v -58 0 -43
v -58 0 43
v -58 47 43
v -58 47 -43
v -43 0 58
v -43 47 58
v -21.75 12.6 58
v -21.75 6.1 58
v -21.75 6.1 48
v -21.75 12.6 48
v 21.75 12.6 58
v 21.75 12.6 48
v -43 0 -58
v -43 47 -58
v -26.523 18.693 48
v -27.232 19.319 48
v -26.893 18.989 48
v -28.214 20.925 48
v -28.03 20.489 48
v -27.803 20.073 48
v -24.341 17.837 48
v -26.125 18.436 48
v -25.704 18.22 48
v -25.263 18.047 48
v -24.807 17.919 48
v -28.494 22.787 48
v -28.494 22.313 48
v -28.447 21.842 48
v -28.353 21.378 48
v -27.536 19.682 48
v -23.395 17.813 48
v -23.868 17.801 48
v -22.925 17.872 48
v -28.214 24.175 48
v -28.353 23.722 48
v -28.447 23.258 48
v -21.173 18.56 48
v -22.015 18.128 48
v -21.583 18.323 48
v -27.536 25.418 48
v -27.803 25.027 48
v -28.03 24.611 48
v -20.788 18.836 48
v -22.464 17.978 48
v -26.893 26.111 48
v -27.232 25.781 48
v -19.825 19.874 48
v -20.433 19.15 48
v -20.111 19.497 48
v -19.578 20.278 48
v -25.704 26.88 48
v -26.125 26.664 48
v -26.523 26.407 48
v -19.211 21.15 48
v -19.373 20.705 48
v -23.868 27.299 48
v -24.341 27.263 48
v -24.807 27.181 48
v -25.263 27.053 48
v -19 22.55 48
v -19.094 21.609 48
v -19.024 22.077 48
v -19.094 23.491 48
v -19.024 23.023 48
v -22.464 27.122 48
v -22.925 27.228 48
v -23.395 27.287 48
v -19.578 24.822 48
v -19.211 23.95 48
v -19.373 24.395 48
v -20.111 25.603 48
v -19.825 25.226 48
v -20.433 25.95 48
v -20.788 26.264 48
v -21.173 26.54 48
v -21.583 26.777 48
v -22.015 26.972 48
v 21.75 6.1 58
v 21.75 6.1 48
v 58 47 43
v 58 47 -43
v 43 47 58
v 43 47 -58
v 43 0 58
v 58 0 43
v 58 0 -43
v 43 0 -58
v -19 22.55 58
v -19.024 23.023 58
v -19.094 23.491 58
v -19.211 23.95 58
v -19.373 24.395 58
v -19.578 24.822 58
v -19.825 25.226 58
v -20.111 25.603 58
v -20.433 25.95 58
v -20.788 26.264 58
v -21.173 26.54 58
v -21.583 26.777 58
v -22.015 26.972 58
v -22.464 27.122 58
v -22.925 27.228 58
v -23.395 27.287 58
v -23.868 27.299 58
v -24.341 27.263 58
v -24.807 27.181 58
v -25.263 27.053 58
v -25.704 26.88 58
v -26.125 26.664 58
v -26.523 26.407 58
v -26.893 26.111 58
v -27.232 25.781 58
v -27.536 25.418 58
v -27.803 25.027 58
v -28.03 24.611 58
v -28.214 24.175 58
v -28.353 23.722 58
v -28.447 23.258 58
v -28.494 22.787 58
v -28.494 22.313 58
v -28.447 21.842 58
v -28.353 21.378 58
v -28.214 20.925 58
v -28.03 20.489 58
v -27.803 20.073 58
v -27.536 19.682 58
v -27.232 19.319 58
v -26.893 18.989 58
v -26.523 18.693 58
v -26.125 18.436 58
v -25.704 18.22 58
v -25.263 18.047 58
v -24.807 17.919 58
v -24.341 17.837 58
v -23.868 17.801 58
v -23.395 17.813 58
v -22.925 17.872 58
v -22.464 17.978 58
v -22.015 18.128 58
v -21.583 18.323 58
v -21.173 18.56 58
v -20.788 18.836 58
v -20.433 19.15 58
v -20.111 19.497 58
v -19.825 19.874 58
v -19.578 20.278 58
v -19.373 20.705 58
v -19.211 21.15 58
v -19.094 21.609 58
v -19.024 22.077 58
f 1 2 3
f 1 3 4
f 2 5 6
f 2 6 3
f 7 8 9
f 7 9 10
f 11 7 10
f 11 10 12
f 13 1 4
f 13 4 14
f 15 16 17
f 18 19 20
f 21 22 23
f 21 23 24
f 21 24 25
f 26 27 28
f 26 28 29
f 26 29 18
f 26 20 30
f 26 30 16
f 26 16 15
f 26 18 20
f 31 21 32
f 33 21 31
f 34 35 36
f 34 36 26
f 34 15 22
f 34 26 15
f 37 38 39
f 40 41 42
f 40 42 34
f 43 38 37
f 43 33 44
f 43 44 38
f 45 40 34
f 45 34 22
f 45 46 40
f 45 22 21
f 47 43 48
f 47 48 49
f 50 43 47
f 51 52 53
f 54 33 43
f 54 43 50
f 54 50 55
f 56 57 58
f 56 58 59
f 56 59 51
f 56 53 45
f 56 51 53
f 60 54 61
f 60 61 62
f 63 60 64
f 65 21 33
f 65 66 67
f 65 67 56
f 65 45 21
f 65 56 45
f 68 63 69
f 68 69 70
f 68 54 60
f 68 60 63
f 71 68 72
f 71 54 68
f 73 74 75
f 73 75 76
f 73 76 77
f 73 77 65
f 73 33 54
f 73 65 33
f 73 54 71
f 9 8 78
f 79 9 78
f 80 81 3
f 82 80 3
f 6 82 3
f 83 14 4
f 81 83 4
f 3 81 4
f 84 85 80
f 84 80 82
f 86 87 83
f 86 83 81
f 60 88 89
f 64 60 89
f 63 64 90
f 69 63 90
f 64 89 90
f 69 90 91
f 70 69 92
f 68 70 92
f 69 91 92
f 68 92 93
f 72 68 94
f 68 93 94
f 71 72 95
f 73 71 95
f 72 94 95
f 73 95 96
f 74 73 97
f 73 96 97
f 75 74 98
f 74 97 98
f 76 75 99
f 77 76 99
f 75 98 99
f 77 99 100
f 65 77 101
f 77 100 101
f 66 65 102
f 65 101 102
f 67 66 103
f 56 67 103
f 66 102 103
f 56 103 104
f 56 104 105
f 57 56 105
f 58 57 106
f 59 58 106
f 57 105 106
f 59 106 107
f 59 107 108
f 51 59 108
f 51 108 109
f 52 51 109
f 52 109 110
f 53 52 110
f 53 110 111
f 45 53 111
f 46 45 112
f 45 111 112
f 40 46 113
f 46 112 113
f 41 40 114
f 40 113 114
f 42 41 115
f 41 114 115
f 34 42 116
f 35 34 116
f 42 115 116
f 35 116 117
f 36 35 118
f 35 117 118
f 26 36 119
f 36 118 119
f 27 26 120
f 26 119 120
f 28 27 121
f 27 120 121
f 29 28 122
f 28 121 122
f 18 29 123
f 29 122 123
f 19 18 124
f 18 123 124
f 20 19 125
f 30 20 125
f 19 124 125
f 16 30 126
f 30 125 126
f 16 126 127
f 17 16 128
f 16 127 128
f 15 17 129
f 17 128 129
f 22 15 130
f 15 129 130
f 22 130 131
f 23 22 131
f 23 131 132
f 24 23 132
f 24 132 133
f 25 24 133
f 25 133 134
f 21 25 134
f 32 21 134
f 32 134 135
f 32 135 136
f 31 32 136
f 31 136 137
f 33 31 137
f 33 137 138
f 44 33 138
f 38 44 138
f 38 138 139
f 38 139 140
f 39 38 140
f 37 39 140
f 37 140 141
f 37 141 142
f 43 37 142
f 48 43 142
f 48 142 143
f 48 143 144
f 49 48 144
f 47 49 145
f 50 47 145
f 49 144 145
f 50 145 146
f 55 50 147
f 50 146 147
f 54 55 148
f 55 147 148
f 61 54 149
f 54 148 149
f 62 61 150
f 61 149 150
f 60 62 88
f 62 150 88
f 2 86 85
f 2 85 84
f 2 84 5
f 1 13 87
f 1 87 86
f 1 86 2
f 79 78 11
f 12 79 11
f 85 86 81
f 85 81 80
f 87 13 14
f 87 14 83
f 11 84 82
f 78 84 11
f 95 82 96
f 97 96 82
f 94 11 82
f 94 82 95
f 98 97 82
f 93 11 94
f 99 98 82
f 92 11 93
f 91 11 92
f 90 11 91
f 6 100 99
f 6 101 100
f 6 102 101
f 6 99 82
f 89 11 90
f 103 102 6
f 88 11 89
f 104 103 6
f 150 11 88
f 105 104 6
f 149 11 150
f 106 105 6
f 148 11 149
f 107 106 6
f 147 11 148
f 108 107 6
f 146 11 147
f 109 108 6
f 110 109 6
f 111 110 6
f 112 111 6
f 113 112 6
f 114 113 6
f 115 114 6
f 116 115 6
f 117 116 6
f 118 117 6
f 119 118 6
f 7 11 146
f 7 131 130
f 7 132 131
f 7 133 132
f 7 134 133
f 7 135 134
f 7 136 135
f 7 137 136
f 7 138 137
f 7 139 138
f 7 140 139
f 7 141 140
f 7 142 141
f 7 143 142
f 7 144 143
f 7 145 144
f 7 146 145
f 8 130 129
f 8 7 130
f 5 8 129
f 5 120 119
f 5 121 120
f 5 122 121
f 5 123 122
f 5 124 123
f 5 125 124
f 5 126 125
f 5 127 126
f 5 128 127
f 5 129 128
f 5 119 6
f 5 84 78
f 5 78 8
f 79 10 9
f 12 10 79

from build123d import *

# Parameters (mm, degrees)
BOSS_EXTRUDE1_DEPTH = 47
SKETCH3_R           = 4.75
SKETCH3_W           = 43.5
SKETCH3_H           = 6.5
CUT_EXTRUDE1_DEPTH  = 10


with BuildPart() as part:
    # Sketch2 → Boss-Extrude1 (new body)
    with BuildSketch(Plane(origin=(0, 0, 0), x_dir=(1, 0, 0), z_dir=(0, 1, 0))):
        Polygon((-43, 58), (43, 58), (58, 43), (58, -43), (43, -58), (-43, -58), (-58, -43), (-58, 43), align=None)
    extrude(amount=BOSS_EXTRUDE1_DEPTH)

    # Sketch3 → Cut-Extrude1 (cut)
    with BuildSketch(Plane.XY.offset(58)):
        with Locations((-23.75, 22.55)):
            Circle(SKETCH3_R)
        with Locations((0, 9.35)):
            Rectangle(SKETCH3_W, SKETCH3_H)
    extrude(amount=-CUT_EXTRUDE1_DEPTH, mode=Mode.SUBTRACT)


solid = part.part
